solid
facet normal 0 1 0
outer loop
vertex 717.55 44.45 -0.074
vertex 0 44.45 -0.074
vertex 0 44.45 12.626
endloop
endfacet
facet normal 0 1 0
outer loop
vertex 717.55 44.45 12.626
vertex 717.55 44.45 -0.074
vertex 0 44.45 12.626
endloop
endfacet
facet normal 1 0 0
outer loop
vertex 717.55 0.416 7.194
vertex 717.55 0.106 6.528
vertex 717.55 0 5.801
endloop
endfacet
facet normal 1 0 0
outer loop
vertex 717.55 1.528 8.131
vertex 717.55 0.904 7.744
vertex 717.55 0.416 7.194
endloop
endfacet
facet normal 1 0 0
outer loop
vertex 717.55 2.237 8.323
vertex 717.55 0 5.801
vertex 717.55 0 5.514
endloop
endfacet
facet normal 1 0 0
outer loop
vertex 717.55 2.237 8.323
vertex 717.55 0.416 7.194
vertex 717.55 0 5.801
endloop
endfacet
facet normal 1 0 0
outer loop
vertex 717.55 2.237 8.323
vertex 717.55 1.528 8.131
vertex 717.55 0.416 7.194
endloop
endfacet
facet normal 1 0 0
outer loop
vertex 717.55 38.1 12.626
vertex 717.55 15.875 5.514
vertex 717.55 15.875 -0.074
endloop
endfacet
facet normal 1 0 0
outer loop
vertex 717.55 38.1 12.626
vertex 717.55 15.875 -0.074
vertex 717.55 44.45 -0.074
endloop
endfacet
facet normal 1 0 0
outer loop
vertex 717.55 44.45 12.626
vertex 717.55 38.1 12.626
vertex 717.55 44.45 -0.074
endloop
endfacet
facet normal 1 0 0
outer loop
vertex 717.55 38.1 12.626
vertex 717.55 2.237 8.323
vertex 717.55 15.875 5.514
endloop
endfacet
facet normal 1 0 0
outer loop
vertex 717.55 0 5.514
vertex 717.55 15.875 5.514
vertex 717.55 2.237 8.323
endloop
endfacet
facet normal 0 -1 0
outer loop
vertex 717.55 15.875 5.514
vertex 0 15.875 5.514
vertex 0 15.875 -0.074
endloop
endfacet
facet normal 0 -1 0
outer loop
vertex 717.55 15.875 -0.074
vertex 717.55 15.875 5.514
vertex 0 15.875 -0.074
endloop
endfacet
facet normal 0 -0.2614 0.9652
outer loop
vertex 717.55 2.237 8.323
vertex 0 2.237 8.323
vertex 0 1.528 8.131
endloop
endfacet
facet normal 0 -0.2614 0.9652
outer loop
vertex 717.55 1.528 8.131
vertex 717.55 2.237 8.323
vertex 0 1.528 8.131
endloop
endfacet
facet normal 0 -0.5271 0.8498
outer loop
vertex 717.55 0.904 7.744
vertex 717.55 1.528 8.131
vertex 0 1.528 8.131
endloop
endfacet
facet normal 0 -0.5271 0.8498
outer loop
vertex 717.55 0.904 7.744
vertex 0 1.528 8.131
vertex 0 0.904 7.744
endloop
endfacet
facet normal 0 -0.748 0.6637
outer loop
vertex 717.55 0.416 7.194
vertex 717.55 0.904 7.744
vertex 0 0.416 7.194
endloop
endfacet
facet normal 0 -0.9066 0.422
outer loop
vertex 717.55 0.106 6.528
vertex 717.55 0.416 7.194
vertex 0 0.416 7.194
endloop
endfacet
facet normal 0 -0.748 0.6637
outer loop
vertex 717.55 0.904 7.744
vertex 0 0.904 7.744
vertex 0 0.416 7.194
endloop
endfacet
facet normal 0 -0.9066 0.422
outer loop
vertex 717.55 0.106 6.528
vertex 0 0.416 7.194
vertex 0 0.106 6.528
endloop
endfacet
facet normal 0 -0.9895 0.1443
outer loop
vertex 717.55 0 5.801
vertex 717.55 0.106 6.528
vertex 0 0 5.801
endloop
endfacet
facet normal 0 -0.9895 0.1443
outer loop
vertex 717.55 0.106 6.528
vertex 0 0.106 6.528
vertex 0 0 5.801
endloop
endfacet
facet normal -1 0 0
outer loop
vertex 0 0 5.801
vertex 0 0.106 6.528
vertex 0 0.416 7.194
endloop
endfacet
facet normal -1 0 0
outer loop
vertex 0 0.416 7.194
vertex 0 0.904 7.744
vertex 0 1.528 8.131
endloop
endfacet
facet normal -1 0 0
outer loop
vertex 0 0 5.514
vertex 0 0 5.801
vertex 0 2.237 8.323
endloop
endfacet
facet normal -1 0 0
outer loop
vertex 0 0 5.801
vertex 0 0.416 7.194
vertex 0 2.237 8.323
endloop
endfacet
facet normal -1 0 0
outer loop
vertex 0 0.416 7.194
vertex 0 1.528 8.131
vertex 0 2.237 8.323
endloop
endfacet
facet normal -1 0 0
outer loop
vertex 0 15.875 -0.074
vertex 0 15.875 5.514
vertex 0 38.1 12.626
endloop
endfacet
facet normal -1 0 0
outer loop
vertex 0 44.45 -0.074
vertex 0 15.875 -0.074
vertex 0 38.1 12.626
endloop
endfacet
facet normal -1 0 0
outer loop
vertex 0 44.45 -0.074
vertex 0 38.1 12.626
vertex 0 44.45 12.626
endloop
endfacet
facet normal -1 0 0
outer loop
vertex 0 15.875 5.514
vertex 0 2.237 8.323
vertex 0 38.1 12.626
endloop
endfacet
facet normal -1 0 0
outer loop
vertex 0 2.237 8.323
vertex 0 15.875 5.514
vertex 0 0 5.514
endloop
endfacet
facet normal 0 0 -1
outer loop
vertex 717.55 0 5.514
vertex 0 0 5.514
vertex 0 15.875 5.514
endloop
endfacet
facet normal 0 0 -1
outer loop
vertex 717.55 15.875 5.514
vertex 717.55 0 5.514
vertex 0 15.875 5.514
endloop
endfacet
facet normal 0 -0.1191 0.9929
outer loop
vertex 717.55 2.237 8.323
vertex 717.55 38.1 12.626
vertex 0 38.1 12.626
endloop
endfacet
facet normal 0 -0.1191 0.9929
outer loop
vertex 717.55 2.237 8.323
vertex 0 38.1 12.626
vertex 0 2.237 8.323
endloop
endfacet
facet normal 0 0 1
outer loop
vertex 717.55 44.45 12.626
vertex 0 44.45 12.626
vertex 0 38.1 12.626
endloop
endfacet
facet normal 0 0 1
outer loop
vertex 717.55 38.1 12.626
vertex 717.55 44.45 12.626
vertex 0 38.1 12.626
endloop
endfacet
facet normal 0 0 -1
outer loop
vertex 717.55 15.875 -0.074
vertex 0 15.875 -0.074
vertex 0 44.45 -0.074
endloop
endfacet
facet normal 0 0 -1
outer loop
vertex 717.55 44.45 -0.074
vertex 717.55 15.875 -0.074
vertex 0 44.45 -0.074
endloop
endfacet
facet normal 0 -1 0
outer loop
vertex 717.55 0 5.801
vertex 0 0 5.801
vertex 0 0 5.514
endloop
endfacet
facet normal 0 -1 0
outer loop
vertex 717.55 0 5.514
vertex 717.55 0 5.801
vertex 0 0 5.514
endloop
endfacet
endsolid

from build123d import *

# Parameters (mm, degrees)
F1_DEPTH = 717.55


with BuildPart() as f1:
    # F0 (on Right) → F1 (new body)
    with BuildSketch(Plane.YZ):
        with BuildLine():
            Line((15.875, 5.514235), (15.875, -0.073765))
            Line((15.875, -0.073765), (44.45, -0.073765))
            Line((44.45, -0.073765), (44.45, 12.626235))
            Line((44.45, 12.626235), (38.1, 12.626235))
            Line((38.1, 12.626235), (2.237371, 8.32272))
            ThreePointArc((2.237371, 8.32272), (0.639964, 7.486476), (0, 5.800812))
            Line((0, 5.800812), (0, 5.514235))
            Line((0, 5.514235), (15.875, 5.514235))
        make_face()
    extrude(amount=F1_DEPTH)


solid = f1.part
